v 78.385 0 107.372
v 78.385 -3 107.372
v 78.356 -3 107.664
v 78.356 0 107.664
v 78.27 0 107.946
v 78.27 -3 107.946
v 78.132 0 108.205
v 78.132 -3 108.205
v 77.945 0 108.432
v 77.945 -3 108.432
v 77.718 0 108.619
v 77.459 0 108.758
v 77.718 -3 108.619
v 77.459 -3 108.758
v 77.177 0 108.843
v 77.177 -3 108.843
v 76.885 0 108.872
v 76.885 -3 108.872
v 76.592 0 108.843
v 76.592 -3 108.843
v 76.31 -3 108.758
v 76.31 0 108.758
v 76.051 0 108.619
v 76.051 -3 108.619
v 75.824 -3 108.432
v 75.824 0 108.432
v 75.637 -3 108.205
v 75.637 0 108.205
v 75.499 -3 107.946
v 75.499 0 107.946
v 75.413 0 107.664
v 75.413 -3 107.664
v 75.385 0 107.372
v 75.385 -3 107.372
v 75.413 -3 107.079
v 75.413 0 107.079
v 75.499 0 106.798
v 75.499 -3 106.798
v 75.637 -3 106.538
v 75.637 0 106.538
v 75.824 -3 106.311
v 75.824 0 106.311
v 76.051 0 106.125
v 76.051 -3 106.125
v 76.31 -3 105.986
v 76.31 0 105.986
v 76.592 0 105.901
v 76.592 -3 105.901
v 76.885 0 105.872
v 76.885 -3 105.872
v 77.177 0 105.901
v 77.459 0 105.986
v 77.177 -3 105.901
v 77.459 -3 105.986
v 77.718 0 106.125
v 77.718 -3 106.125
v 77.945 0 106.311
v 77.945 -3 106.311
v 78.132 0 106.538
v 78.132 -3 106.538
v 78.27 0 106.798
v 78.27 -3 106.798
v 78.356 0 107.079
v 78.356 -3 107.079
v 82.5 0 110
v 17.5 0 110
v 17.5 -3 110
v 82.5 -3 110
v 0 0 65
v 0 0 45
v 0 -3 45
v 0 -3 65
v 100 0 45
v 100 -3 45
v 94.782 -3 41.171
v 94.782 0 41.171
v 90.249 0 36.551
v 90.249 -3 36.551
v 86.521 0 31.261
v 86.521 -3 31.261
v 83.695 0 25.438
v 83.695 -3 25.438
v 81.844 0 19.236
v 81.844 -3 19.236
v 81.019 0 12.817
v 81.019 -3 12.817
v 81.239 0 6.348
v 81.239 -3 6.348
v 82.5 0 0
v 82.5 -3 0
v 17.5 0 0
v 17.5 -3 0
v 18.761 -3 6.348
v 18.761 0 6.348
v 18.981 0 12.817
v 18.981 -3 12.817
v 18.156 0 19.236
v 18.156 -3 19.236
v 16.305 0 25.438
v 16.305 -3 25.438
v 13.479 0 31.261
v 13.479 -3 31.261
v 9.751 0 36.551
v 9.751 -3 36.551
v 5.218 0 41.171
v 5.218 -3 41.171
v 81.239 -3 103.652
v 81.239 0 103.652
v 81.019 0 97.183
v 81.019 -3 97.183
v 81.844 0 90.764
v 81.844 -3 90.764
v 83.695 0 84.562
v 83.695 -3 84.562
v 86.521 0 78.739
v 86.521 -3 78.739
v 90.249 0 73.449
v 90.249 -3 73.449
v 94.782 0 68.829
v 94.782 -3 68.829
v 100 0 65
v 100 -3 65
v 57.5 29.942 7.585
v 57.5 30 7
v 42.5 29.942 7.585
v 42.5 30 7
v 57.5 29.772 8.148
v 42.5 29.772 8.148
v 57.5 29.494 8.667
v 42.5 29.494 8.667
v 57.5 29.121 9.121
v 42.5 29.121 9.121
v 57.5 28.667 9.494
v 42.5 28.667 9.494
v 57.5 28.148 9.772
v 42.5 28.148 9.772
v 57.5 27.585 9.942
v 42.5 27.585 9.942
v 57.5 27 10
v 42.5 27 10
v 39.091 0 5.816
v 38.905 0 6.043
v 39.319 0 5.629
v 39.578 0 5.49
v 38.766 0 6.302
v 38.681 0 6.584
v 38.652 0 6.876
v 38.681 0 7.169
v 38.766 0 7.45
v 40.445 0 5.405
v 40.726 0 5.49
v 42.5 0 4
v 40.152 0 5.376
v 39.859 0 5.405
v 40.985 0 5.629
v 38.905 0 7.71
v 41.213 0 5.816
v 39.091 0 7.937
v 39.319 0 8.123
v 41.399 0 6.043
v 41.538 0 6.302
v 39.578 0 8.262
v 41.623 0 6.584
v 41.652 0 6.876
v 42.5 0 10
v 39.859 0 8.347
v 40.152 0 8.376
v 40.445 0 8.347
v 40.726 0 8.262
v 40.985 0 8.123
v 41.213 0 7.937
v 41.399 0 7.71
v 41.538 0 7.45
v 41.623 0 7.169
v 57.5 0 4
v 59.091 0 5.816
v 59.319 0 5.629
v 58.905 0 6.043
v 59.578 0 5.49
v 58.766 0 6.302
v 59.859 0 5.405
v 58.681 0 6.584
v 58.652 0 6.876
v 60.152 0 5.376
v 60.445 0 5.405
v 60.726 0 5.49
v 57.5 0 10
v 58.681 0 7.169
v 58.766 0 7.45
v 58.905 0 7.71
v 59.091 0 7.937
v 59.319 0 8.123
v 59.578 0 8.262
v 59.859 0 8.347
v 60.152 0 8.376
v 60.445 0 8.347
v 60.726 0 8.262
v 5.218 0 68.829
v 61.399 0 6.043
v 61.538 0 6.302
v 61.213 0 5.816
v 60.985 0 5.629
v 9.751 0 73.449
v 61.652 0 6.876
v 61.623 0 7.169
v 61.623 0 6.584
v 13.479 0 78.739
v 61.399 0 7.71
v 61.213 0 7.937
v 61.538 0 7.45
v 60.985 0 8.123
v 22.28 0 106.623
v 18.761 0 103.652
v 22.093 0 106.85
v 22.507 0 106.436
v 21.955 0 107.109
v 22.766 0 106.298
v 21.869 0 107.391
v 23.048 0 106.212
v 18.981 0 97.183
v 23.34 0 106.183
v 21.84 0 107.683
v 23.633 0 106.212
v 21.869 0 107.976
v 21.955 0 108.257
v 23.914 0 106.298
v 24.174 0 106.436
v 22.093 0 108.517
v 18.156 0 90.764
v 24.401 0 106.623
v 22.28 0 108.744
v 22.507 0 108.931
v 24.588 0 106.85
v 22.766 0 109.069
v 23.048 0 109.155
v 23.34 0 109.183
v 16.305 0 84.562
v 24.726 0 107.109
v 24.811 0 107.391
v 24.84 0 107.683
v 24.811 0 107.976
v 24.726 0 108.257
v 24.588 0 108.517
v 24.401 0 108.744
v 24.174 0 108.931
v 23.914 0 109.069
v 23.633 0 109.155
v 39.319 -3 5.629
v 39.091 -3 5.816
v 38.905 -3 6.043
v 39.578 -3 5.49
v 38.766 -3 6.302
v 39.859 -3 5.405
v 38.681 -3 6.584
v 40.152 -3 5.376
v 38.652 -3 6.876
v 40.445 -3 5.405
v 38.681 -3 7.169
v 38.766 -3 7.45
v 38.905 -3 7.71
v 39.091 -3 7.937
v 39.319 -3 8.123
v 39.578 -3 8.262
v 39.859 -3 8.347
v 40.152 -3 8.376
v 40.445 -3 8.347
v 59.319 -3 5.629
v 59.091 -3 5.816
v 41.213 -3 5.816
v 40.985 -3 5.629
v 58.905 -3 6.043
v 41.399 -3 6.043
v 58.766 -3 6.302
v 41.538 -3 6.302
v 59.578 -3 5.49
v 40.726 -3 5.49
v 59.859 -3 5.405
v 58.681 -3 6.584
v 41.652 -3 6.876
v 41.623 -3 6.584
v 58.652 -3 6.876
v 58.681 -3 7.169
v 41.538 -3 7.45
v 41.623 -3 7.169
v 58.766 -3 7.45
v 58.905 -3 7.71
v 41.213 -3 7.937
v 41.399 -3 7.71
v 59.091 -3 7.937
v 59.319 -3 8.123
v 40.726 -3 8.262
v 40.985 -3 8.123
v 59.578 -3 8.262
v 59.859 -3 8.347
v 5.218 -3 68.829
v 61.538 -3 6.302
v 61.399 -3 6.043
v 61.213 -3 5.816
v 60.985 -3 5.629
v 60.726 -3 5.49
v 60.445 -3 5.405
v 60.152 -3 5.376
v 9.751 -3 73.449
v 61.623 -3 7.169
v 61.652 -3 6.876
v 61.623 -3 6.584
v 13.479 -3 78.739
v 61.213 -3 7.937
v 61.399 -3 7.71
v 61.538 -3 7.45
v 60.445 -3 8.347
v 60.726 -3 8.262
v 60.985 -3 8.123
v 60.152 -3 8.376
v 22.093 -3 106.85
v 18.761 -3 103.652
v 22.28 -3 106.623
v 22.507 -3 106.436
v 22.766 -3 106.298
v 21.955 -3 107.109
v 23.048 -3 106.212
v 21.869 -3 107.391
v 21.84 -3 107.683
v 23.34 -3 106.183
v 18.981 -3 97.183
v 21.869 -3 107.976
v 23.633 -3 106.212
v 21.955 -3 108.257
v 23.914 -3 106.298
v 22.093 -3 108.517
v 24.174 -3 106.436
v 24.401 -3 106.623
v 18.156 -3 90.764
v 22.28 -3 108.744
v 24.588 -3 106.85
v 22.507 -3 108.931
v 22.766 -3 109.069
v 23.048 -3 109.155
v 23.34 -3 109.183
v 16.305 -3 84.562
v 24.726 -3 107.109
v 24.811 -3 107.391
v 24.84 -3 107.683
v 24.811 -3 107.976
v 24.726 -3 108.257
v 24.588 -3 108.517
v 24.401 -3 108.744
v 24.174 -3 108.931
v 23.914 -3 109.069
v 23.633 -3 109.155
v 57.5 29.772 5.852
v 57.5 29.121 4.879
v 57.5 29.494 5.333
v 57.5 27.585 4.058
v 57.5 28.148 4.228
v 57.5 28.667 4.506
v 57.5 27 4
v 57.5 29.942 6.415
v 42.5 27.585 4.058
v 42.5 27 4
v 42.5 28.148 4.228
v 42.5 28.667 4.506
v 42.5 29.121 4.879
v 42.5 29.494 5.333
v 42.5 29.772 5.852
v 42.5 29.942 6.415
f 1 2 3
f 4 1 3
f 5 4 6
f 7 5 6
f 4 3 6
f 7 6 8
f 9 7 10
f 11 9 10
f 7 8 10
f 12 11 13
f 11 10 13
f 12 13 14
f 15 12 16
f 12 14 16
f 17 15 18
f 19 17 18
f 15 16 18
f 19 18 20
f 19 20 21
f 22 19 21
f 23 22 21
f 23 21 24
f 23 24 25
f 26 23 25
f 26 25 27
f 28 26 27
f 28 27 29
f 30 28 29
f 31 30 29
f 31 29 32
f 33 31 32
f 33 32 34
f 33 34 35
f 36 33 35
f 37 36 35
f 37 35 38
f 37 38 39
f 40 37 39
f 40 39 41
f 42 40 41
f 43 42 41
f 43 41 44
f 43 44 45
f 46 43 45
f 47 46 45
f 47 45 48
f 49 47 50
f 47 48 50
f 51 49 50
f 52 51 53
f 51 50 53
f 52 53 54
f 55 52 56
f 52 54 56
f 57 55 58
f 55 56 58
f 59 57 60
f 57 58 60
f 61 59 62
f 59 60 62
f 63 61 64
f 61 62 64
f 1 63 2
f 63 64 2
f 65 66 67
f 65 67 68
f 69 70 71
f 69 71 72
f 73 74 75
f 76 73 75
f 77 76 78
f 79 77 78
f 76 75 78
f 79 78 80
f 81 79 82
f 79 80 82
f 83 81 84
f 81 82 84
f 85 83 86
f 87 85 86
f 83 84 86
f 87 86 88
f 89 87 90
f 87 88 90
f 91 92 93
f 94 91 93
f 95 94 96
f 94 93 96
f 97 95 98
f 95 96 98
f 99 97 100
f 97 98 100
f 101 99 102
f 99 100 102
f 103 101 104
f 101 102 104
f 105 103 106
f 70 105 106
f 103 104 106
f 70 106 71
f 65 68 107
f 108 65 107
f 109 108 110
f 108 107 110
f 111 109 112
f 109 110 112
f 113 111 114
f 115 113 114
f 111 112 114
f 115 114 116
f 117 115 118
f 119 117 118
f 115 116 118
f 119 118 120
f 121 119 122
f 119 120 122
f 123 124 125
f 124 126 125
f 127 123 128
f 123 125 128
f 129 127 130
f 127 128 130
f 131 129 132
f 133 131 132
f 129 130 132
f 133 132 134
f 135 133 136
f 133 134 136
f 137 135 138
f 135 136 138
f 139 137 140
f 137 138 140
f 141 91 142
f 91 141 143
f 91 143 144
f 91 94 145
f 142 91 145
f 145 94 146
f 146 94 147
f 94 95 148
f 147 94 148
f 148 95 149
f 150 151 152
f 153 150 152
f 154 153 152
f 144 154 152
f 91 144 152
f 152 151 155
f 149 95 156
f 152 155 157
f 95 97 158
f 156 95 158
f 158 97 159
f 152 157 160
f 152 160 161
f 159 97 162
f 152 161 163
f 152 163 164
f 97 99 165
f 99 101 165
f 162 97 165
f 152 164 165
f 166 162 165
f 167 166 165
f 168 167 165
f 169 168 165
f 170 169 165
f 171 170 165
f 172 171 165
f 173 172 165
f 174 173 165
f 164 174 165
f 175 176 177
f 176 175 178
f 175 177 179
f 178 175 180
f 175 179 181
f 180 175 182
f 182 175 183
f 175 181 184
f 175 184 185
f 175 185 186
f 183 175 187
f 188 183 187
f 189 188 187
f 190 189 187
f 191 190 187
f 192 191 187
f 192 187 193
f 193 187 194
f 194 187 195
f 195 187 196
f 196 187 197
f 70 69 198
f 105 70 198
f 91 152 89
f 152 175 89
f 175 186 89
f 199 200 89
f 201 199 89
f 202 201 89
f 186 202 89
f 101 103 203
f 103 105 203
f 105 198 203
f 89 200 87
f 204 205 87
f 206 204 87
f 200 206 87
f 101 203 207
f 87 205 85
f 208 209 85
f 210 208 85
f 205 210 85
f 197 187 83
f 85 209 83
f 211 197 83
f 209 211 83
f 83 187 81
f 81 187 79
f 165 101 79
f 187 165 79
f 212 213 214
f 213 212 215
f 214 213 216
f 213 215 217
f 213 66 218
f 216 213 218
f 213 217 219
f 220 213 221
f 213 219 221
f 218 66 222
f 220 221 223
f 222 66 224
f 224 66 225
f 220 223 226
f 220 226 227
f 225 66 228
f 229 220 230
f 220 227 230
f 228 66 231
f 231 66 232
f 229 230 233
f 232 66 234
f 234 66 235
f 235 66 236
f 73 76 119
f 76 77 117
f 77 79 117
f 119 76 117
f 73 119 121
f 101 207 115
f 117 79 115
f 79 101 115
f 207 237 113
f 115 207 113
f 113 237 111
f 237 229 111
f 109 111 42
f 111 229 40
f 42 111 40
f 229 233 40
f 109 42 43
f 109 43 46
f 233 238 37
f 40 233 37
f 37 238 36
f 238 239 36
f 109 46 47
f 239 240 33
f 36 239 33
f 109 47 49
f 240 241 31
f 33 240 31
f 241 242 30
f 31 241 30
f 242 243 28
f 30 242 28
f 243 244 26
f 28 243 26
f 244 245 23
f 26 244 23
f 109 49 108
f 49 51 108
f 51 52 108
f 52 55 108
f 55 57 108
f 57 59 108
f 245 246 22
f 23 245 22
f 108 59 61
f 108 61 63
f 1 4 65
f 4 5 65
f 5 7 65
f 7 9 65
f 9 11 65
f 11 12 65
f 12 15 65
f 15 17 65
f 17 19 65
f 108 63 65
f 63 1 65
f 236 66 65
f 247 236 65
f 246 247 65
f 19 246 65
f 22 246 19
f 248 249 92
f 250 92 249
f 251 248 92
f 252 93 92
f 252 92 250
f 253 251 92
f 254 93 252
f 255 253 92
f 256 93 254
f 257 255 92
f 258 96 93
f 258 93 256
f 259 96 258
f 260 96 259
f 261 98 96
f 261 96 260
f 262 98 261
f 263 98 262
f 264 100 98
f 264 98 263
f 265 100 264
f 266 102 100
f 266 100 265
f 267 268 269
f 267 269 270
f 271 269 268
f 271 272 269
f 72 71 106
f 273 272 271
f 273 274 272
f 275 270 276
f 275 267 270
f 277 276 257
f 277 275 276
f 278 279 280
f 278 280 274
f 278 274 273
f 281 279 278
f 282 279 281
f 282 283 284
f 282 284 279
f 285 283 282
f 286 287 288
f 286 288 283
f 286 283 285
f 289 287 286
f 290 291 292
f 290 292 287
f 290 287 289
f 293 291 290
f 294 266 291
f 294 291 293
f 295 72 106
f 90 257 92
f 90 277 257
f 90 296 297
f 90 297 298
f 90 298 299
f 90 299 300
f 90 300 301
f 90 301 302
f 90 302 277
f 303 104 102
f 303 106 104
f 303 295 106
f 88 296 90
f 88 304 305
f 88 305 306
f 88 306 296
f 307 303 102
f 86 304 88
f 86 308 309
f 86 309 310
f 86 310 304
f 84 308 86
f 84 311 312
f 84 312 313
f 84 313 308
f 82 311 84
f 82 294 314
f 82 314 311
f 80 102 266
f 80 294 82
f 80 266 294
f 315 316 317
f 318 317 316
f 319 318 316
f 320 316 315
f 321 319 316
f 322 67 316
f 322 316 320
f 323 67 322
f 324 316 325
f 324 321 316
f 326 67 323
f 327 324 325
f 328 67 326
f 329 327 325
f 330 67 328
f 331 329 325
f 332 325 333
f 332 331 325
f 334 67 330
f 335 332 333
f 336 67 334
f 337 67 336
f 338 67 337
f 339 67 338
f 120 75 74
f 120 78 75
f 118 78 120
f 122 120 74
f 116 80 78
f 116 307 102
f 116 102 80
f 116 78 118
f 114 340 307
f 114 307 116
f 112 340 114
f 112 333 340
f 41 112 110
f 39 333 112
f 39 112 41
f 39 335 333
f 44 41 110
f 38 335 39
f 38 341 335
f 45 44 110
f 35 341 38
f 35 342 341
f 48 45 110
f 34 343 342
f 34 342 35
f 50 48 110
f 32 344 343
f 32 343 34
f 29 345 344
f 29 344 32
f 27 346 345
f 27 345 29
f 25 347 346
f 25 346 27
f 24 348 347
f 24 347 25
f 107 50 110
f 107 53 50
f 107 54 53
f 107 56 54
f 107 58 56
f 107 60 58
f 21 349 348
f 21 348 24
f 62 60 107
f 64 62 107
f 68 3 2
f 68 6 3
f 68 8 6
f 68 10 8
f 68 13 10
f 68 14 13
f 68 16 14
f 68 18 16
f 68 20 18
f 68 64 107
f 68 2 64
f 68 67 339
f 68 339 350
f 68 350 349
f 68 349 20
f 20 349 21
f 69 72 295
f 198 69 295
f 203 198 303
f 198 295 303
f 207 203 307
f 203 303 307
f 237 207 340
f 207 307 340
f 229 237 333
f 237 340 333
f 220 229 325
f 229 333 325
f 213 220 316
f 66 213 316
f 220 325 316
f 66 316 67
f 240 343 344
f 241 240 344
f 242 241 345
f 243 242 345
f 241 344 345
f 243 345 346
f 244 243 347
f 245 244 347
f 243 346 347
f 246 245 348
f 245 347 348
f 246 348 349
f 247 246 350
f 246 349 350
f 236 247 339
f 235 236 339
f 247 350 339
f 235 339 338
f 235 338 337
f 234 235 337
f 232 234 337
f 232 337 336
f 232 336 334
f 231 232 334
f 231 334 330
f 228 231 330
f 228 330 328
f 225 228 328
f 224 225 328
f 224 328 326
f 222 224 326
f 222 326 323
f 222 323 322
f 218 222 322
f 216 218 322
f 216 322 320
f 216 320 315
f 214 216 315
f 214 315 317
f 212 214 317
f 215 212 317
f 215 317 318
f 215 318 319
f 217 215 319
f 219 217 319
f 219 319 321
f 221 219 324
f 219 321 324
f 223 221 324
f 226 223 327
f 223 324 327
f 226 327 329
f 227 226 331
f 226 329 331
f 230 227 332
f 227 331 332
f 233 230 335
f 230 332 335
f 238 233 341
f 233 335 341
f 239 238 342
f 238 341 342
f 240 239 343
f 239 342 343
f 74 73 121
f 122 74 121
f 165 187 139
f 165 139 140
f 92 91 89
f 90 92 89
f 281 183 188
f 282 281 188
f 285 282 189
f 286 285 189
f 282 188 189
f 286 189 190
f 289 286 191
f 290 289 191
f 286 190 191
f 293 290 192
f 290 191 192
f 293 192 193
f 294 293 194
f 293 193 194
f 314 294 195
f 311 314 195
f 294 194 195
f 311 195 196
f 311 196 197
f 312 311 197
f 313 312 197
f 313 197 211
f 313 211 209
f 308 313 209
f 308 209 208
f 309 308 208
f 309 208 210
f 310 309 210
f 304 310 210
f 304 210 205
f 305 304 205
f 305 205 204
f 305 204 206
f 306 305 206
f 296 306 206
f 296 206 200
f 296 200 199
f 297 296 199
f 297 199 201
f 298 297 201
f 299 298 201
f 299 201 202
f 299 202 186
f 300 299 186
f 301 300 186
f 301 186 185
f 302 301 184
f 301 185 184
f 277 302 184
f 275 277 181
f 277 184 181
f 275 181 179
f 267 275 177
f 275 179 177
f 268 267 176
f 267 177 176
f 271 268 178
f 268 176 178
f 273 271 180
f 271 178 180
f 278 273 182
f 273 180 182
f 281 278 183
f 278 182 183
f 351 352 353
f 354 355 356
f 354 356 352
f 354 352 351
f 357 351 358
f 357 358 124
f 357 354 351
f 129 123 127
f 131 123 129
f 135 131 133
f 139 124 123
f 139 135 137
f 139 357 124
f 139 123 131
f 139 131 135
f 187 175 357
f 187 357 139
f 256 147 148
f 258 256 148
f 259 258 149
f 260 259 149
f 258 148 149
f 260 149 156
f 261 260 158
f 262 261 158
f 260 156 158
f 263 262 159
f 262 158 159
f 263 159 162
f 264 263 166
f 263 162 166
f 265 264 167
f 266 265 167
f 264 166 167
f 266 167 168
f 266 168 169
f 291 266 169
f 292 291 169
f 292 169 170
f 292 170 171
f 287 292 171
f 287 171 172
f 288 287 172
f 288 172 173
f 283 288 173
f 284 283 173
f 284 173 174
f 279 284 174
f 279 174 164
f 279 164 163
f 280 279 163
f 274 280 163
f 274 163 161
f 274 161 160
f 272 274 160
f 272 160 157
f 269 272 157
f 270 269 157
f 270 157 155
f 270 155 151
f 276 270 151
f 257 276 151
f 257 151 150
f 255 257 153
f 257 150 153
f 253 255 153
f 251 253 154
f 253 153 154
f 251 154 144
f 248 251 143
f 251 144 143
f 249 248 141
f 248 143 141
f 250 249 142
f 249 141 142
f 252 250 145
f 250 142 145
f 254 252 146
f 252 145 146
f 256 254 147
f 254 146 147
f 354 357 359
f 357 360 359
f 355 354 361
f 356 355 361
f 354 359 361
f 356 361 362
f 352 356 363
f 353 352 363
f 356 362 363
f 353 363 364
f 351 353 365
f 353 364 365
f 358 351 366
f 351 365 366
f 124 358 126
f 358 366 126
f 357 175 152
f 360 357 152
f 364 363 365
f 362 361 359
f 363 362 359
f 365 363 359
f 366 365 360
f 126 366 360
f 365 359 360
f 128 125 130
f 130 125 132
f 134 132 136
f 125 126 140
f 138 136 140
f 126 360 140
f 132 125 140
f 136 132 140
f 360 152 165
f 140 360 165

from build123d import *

# Parameters (mm, degrees)
F0_W      = 100
F0_H      = 110
F1_DEPTH  = 3
F3_DEPTH  = 25
F4_W      = 15
F4_H      = 6
F5_DEPTH  = 30
F6_R      = 3
F7_R      = 2.99999
F8_R      = 1.5
F9_DEPTH  = 25
F10_R     = 1.5
F11_DEPTH = 25


# Not quite as in the source:
# - a fillet or chamfer is up to 0.001 mm smaller than in the source, because OpenCascade refuses the exact size


with BuildPart() as f1:
    # F0 (on Front) → F1 (new body)
    with BuildSketch(Plane.XZ):
        with Locations((50, 55)):
            Rectangle(F0_W, F0_H)
    extrude(amount=F1_DEPTH)

    # F2 (on face) → F3 (cut)
    with BuildSketch(Plane.XZ.offset(3)):
        with BuildLine():
            Line((0, 110), (0, 65))
            ThreePointArc((0, 65), (16.3054104548, 84.5617848231), (17.5, 110))
            Line((17.5, 110), (0, 110))
        make_face()
        with BuildLine():
            Line((100, 110), (82.5, 110))
            ThreePointArc((82.5, 110), (83.6945895452, 84.5617848231), (100, 65))
            Line((100, 65), (100, 110))
        make_face()
        with BuildLine():
            ThreePointArc((100, 45), (83.6945895452, 25.4382151769), (82.5, 0))
            Line((82.5, 0), (100, 0))
            Line((100, 0), (100, 45))
        make_face()
        with BuildLine():
            Line((0, 45), (0, 0))
            Line((0, 0), (17.5, 0))
            ThreePointArc((17.5, 0), (16.3054104548, 25.4382151769), (0, 45))
        make_face()
    extrude(amount=-F3_DEPTH, mode=Mode.SUBTRACT)

    # F4 (on face) → F5 (join)
    with BuildSketch(Plane(origin=(0, 0, 0), x_dir=(-1, 0, 0), z_dir=(0, 1, 0))):
        with Locations((-50, 7)):
            Rectangle(F4_W, F4_H)
    extrude(amount=F5_DEPTH)

    # F6
    f6_edges = [f1.edges().sort_by_distance(p)[0] for p in [
        (50, 30, 4),
    ]]
    fillet(f6_edges, radius=F6_R)

    # F7 (radius 3 in the source; OpenCascade refuses exactly that, so slightly less here)
    f7_edges = [f1.edges().sort_by_distance(p)[0] for p in [
        (50, 30, 10),
    ]]
    fillet(f7_edges, radius=F7_R)

    # F8 (on face) → F9 (cut)
    with BuildSketch(Plane(origin=(0, 0, 0), x_dir=(-1, 0, 0), z_dir=(0, 1, 0))):
        with Locations((-40.1520836353, 6.8762069568)):
            Circle(F8_R)
        with Locations((-60.1520836353, 6.8762069568)):
            Circle(F8_R)
    extrude(amount=-F9_DEPTH, mode=Mode.SUBTRACT)

    # F10 (on face) → F11 (cut)
    with BuildSketch(Plane.XZ.offset(3)):
        with Locations((23.3403220773, 107.6833680272)):
            Circle(F10_R)
        with Locations((76.8845230341, 107.3717549443)):
            Circle(F10_R)
    extrude(amount=-F11_DEPTH, mode=Mode.SUBTRACT)


solid = f1.part
